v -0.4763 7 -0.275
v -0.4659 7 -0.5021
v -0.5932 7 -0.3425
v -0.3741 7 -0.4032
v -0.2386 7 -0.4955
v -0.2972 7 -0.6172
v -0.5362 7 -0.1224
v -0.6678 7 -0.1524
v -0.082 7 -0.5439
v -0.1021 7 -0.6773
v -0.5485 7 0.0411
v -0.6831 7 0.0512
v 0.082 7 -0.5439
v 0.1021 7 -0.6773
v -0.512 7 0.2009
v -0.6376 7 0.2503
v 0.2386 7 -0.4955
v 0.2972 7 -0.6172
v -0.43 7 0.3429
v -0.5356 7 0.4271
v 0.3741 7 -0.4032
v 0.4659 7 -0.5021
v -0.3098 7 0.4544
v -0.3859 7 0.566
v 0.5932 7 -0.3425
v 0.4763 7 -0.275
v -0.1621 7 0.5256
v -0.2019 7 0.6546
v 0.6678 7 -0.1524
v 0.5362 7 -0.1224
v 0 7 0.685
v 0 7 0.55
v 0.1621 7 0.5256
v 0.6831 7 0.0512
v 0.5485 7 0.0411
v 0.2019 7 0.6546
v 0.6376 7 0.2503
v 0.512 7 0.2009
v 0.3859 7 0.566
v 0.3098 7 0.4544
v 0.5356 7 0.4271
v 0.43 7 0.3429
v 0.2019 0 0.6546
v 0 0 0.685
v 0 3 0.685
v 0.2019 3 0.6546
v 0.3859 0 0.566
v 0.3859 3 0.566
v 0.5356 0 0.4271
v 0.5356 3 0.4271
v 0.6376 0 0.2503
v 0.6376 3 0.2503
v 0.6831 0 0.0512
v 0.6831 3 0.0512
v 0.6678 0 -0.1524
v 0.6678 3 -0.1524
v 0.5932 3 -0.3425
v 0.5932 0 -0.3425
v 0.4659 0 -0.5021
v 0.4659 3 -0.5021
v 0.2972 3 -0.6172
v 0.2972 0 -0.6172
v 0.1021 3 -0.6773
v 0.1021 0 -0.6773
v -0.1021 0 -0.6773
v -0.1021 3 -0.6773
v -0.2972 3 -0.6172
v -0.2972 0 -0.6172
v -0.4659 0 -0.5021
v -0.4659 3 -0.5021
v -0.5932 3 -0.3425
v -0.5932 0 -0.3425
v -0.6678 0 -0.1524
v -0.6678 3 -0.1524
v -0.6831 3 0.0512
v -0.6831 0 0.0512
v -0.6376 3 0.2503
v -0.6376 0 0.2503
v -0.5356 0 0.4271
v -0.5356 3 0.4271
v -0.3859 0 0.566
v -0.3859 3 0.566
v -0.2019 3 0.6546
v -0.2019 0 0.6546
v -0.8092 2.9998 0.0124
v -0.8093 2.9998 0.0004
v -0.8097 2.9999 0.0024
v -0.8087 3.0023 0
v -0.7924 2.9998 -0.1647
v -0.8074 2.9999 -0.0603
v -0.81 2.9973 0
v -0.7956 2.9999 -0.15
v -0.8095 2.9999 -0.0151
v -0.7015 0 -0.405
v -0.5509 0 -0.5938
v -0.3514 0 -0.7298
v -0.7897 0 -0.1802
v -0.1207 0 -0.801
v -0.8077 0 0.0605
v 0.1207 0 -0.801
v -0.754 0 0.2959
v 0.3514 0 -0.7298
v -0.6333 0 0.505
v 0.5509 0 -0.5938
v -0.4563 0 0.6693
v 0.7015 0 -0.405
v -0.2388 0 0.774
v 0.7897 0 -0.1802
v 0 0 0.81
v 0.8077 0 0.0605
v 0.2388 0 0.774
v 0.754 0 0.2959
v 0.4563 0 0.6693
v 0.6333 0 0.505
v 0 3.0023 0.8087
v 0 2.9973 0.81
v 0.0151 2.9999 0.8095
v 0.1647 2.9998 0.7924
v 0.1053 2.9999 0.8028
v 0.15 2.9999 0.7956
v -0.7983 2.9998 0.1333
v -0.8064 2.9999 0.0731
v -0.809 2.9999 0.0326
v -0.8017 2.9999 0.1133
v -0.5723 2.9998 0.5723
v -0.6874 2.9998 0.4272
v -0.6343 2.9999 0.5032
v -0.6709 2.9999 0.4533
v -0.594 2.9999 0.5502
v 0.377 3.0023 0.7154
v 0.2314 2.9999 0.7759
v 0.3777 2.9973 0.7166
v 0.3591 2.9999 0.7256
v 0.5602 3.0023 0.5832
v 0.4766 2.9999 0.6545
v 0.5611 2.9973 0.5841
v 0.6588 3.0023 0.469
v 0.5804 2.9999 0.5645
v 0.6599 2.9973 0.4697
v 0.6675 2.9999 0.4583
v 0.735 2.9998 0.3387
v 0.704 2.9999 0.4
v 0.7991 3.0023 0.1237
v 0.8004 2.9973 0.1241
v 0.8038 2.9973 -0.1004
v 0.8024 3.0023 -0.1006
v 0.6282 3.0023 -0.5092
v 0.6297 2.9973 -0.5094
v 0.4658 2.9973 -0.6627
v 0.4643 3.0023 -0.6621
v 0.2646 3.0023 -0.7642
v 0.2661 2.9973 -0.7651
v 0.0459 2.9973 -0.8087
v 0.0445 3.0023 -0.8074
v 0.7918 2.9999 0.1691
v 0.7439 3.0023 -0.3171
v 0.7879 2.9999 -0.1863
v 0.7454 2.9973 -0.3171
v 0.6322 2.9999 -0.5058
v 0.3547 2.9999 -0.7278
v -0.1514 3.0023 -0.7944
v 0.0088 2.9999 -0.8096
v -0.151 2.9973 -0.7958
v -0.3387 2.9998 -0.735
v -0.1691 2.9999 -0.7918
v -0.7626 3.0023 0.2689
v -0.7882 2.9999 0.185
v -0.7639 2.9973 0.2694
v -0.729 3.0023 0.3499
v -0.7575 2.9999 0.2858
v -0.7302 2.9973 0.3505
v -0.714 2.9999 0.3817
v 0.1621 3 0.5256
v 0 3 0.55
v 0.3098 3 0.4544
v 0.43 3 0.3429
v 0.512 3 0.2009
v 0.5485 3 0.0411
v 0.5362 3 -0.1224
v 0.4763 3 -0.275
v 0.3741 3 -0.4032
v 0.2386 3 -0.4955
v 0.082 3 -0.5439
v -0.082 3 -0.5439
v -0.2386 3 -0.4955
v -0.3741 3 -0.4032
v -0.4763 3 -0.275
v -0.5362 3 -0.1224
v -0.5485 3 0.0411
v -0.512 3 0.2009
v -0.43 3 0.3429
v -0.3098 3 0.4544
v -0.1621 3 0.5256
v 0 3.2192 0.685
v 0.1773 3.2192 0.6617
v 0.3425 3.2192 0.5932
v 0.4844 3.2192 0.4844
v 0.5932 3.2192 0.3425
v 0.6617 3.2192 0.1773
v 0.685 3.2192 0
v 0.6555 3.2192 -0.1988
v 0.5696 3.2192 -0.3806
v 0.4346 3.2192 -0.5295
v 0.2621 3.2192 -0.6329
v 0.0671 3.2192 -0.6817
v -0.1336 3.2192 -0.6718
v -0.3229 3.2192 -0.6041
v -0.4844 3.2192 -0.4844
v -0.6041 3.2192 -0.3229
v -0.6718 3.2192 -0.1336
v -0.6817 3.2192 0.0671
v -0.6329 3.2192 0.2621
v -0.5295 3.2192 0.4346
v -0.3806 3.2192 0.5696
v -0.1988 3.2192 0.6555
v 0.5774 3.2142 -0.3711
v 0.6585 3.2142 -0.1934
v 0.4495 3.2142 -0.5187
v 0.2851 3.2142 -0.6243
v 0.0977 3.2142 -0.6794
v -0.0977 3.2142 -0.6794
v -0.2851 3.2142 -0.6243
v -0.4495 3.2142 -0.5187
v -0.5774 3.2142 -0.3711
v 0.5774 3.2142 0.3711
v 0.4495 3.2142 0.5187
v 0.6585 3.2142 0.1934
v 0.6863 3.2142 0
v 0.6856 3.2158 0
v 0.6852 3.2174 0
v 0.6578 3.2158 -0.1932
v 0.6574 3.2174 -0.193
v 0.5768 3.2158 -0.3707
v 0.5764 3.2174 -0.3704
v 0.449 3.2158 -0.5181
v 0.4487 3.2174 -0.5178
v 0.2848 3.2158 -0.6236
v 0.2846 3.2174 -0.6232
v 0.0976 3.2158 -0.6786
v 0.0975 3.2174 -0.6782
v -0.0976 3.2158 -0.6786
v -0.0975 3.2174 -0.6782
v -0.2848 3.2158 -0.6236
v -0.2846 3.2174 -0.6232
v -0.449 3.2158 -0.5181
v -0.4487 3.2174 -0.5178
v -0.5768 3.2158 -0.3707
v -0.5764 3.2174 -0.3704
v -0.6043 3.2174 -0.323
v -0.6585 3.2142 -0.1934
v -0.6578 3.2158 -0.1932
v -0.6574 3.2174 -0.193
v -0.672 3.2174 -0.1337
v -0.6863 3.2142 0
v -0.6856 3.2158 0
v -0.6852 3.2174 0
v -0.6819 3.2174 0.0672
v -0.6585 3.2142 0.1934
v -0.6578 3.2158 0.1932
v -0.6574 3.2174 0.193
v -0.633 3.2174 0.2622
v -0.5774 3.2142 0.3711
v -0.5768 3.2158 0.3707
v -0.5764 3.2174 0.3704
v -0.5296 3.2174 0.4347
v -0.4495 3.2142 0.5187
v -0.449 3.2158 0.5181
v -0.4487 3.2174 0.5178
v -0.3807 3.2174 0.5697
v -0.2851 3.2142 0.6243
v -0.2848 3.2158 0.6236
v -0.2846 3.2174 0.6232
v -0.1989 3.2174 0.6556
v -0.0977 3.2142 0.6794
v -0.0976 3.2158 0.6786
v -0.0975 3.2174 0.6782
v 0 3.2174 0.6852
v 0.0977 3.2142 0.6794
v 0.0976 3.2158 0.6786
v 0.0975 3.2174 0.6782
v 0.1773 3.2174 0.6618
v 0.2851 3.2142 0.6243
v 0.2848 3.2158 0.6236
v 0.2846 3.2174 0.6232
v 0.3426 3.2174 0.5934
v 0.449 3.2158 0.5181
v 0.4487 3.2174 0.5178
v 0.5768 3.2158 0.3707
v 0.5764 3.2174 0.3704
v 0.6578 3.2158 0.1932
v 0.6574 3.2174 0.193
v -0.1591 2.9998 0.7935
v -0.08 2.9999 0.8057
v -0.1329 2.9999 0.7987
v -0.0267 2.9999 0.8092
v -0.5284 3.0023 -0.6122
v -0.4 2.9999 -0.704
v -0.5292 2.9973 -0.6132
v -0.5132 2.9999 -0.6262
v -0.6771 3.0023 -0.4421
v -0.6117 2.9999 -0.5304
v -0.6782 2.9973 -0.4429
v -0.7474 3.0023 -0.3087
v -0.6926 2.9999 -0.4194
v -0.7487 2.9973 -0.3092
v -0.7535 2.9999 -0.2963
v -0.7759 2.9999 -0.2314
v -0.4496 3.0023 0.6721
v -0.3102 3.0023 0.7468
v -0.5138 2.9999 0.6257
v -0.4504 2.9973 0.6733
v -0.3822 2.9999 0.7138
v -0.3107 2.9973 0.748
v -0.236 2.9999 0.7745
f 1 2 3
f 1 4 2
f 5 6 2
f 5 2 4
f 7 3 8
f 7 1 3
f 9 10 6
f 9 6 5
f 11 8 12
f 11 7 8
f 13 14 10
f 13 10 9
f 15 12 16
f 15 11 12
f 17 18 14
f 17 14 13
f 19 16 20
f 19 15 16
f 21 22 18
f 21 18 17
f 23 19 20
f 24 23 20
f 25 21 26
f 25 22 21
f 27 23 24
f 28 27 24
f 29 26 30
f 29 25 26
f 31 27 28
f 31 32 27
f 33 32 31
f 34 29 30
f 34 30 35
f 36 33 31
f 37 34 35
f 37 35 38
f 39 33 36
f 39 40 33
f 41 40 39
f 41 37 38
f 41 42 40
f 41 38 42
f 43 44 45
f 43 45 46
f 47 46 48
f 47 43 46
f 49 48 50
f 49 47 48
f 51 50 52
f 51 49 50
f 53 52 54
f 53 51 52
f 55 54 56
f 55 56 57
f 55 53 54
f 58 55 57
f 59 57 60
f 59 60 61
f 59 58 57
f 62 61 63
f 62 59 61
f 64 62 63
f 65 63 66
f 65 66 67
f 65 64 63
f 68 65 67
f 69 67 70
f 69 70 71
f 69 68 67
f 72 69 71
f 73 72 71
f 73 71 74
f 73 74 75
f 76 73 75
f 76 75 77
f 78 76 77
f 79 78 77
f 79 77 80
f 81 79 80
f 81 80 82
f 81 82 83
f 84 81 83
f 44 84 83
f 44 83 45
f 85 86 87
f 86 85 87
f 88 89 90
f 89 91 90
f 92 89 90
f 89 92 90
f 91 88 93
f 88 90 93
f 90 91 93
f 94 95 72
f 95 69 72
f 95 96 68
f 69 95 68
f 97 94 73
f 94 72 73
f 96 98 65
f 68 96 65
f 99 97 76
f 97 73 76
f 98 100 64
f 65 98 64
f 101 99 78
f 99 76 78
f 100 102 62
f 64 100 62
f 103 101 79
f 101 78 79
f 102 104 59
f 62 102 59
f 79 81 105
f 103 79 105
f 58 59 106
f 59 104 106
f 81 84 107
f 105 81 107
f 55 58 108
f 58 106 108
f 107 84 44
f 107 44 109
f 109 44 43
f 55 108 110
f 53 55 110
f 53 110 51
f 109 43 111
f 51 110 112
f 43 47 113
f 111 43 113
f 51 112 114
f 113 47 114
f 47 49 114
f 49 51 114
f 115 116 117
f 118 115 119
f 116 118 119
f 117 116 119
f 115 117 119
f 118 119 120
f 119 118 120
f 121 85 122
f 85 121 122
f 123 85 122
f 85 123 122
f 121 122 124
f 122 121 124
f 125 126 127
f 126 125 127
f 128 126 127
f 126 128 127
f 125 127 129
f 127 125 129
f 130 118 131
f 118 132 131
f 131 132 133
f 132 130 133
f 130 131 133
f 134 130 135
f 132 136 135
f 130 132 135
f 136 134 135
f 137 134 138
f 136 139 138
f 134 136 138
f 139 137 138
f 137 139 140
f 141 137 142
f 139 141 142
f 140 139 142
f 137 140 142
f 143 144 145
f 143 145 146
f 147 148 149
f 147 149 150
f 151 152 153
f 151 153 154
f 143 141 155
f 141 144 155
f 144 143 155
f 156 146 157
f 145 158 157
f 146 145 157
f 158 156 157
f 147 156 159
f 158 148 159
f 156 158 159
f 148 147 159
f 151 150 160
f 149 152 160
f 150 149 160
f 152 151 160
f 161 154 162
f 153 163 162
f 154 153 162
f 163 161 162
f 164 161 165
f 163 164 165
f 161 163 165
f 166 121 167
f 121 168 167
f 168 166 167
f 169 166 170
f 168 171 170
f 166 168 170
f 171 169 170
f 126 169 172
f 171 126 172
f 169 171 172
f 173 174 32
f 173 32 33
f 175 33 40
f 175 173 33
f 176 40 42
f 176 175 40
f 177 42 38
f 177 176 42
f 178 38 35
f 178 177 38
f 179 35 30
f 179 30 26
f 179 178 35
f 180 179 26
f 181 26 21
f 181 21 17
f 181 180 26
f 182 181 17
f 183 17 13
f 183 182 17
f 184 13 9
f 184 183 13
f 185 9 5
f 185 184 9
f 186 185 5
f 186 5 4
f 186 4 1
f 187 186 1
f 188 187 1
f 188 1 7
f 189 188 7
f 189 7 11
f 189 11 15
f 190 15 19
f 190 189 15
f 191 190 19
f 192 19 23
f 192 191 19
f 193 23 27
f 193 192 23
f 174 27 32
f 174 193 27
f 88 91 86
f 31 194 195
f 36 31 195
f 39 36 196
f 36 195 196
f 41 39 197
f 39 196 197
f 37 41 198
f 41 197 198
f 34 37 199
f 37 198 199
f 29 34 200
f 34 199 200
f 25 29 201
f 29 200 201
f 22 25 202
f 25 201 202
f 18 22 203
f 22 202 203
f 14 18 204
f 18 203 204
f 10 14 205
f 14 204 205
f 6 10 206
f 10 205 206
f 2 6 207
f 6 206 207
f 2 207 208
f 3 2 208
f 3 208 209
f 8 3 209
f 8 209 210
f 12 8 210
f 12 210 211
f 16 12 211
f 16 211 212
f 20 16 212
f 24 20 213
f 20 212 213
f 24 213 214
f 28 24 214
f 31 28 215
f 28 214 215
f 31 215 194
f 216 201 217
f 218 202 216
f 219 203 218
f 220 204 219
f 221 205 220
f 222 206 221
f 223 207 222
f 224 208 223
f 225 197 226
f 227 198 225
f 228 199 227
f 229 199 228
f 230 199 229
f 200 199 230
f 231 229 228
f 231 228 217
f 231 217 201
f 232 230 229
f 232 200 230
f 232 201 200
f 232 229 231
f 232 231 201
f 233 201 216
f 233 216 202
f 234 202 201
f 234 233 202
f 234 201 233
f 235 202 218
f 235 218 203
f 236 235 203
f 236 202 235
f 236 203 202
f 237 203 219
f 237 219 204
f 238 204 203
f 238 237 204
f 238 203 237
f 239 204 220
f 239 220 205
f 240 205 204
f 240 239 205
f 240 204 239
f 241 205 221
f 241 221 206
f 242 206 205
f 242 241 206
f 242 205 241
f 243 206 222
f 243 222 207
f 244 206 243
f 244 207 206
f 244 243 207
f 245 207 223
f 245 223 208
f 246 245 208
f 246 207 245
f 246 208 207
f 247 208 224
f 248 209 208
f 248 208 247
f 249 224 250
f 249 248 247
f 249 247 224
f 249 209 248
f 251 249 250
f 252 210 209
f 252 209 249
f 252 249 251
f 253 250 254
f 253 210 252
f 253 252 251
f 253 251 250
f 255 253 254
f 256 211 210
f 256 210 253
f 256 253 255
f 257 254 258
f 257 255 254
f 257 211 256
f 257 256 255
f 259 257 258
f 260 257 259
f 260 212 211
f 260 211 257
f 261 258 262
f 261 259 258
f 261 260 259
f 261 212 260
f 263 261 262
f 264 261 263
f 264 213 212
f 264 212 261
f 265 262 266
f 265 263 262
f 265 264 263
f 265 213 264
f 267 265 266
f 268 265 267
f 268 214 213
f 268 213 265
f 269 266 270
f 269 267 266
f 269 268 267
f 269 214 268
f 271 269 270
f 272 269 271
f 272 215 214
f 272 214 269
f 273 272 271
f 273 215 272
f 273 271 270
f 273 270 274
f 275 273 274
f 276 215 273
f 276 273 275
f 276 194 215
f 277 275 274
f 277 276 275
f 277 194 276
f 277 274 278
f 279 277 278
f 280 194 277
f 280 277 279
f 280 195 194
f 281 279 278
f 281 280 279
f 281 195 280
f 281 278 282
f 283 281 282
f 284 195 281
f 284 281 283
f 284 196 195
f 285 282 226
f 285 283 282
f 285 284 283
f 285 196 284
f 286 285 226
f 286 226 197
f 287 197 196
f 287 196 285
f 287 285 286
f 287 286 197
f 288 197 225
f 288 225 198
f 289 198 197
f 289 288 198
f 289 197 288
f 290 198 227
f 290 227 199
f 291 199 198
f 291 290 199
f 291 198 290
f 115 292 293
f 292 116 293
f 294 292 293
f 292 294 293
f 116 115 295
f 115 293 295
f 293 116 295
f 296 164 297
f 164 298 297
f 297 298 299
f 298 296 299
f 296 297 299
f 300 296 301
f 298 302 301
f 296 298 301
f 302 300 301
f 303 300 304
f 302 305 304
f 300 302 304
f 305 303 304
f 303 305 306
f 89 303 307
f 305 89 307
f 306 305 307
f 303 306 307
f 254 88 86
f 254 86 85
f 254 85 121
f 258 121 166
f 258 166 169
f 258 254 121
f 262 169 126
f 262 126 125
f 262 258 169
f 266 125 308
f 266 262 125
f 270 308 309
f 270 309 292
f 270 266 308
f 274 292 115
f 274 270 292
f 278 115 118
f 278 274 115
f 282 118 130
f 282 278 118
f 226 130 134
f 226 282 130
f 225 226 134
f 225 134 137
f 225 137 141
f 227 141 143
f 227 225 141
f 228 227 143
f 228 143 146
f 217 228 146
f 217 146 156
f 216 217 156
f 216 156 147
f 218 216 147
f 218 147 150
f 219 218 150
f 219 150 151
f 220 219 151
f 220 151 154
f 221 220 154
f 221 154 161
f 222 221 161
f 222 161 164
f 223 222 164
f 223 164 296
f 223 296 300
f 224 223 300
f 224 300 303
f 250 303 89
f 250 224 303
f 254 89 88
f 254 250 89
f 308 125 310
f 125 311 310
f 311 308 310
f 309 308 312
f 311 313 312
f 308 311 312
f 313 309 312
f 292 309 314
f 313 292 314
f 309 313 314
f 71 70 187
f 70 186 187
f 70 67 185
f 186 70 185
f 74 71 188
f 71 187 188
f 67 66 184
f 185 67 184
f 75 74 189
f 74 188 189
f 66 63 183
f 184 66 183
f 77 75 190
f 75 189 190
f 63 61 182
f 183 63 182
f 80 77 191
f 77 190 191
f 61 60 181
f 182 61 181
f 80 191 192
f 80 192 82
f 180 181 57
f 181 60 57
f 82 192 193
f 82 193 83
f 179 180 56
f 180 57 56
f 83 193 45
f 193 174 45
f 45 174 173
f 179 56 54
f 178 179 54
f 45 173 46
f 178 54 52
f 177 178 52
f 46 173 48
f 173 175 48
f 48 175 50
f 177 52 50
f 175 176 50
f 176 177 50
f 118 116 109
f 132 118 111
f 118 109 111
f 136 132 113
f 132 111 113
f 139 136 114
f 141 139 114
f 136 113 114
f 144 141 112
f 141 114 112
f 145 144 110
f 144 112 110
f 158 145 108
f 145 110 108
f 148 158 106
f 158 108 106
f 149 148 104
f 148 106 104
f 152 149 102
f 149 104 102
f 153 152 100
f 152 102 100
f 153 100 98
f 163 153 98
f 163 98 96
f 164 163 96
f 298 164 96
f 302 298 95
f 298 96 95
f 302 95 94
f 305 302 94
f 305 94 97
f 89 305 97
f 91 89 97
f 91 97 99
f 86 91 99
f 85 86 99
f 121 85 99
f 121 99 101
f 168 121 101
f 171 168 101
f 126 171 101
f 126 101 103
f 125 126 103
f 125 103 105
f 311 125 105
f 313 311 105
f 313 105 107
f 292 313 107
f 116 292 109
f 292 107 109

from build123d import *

# Parameters (mm, degrees)
SKETCH1_R           = 0.81
SKETCH1_R_2         = 0.685
BOSS_EXTRUDE1_DEPTH = 3
SKETCH2_R           = 0.685
SKETCH2_R_2         = 0.55
BOSS_EXTRUDE2_DEPTH = 4
FILLET1_R           = 0.01
FILLET2_R           = 0.01


with BuildPart() as part:
    # Sketch1 → Boss-Extrude1 (new body)
    with BuildSketch(Plane(origin=(0, 0, 0), x_dir=(1, 0, 0), z_dir=(0, 1, 0))):
        Circle(SKETCH1_R)
        Circle(SKETCH1_R_2, mode=Mode.SUBTRACT)
    extrude(amount=BOSS_EXTRUDE1_DEPTH)


with BuildPart() as body_2:
    # Sketch2 → Boss-Extrude2 (new body)
    with BuildSketch(Plane(origin=(0, 3, 0), x_dir=(1, 0, 0), z_dir=(0, 1, 0))):
        Circle(SKETCH2_R)
        Circle(SKETCH2_R_2, mode=Mode.SUBTRACT)
    extrude(amount=BOSS_EXTRUDE2_DEPTH)


with BuildPart() as revolve1_tool:
    # Sketch3 → Revolve1 (revolve)
    with BuildSketch(Plane.XY):
        Polygon((-0.81, 3), (-0.685, 3.216506351), (-0.685, 3), align=None)
    revolve(axis=Axis((0, 0, 0), (0, 1, 0)))


with BuildPart() as part_1:
    add(part.part)


with BuildPart() as part_2:
    # Revolve1: joined with revolve1_tool
    add(part_1.part.fuse(revolve1_tool.part, body_2.part, tol=0.00001))

    # Fillet1
    fillet1_edges = [part_2.edges().sort_by_distance(p)[0] for p in [
        (0, 3, 0.81),
    ]]
    fillet(fillet1_edges, radius=FILLET1_R)

    # Fillet2
    fillet2_edges = [part_2.edges().sort_by_distance(p)[0] for p in [
        (0, 3.216506351, -0.685),
    ]]
    fillet(fillet2_edges, radius=FILLET2_R)


solid = part_2.part
